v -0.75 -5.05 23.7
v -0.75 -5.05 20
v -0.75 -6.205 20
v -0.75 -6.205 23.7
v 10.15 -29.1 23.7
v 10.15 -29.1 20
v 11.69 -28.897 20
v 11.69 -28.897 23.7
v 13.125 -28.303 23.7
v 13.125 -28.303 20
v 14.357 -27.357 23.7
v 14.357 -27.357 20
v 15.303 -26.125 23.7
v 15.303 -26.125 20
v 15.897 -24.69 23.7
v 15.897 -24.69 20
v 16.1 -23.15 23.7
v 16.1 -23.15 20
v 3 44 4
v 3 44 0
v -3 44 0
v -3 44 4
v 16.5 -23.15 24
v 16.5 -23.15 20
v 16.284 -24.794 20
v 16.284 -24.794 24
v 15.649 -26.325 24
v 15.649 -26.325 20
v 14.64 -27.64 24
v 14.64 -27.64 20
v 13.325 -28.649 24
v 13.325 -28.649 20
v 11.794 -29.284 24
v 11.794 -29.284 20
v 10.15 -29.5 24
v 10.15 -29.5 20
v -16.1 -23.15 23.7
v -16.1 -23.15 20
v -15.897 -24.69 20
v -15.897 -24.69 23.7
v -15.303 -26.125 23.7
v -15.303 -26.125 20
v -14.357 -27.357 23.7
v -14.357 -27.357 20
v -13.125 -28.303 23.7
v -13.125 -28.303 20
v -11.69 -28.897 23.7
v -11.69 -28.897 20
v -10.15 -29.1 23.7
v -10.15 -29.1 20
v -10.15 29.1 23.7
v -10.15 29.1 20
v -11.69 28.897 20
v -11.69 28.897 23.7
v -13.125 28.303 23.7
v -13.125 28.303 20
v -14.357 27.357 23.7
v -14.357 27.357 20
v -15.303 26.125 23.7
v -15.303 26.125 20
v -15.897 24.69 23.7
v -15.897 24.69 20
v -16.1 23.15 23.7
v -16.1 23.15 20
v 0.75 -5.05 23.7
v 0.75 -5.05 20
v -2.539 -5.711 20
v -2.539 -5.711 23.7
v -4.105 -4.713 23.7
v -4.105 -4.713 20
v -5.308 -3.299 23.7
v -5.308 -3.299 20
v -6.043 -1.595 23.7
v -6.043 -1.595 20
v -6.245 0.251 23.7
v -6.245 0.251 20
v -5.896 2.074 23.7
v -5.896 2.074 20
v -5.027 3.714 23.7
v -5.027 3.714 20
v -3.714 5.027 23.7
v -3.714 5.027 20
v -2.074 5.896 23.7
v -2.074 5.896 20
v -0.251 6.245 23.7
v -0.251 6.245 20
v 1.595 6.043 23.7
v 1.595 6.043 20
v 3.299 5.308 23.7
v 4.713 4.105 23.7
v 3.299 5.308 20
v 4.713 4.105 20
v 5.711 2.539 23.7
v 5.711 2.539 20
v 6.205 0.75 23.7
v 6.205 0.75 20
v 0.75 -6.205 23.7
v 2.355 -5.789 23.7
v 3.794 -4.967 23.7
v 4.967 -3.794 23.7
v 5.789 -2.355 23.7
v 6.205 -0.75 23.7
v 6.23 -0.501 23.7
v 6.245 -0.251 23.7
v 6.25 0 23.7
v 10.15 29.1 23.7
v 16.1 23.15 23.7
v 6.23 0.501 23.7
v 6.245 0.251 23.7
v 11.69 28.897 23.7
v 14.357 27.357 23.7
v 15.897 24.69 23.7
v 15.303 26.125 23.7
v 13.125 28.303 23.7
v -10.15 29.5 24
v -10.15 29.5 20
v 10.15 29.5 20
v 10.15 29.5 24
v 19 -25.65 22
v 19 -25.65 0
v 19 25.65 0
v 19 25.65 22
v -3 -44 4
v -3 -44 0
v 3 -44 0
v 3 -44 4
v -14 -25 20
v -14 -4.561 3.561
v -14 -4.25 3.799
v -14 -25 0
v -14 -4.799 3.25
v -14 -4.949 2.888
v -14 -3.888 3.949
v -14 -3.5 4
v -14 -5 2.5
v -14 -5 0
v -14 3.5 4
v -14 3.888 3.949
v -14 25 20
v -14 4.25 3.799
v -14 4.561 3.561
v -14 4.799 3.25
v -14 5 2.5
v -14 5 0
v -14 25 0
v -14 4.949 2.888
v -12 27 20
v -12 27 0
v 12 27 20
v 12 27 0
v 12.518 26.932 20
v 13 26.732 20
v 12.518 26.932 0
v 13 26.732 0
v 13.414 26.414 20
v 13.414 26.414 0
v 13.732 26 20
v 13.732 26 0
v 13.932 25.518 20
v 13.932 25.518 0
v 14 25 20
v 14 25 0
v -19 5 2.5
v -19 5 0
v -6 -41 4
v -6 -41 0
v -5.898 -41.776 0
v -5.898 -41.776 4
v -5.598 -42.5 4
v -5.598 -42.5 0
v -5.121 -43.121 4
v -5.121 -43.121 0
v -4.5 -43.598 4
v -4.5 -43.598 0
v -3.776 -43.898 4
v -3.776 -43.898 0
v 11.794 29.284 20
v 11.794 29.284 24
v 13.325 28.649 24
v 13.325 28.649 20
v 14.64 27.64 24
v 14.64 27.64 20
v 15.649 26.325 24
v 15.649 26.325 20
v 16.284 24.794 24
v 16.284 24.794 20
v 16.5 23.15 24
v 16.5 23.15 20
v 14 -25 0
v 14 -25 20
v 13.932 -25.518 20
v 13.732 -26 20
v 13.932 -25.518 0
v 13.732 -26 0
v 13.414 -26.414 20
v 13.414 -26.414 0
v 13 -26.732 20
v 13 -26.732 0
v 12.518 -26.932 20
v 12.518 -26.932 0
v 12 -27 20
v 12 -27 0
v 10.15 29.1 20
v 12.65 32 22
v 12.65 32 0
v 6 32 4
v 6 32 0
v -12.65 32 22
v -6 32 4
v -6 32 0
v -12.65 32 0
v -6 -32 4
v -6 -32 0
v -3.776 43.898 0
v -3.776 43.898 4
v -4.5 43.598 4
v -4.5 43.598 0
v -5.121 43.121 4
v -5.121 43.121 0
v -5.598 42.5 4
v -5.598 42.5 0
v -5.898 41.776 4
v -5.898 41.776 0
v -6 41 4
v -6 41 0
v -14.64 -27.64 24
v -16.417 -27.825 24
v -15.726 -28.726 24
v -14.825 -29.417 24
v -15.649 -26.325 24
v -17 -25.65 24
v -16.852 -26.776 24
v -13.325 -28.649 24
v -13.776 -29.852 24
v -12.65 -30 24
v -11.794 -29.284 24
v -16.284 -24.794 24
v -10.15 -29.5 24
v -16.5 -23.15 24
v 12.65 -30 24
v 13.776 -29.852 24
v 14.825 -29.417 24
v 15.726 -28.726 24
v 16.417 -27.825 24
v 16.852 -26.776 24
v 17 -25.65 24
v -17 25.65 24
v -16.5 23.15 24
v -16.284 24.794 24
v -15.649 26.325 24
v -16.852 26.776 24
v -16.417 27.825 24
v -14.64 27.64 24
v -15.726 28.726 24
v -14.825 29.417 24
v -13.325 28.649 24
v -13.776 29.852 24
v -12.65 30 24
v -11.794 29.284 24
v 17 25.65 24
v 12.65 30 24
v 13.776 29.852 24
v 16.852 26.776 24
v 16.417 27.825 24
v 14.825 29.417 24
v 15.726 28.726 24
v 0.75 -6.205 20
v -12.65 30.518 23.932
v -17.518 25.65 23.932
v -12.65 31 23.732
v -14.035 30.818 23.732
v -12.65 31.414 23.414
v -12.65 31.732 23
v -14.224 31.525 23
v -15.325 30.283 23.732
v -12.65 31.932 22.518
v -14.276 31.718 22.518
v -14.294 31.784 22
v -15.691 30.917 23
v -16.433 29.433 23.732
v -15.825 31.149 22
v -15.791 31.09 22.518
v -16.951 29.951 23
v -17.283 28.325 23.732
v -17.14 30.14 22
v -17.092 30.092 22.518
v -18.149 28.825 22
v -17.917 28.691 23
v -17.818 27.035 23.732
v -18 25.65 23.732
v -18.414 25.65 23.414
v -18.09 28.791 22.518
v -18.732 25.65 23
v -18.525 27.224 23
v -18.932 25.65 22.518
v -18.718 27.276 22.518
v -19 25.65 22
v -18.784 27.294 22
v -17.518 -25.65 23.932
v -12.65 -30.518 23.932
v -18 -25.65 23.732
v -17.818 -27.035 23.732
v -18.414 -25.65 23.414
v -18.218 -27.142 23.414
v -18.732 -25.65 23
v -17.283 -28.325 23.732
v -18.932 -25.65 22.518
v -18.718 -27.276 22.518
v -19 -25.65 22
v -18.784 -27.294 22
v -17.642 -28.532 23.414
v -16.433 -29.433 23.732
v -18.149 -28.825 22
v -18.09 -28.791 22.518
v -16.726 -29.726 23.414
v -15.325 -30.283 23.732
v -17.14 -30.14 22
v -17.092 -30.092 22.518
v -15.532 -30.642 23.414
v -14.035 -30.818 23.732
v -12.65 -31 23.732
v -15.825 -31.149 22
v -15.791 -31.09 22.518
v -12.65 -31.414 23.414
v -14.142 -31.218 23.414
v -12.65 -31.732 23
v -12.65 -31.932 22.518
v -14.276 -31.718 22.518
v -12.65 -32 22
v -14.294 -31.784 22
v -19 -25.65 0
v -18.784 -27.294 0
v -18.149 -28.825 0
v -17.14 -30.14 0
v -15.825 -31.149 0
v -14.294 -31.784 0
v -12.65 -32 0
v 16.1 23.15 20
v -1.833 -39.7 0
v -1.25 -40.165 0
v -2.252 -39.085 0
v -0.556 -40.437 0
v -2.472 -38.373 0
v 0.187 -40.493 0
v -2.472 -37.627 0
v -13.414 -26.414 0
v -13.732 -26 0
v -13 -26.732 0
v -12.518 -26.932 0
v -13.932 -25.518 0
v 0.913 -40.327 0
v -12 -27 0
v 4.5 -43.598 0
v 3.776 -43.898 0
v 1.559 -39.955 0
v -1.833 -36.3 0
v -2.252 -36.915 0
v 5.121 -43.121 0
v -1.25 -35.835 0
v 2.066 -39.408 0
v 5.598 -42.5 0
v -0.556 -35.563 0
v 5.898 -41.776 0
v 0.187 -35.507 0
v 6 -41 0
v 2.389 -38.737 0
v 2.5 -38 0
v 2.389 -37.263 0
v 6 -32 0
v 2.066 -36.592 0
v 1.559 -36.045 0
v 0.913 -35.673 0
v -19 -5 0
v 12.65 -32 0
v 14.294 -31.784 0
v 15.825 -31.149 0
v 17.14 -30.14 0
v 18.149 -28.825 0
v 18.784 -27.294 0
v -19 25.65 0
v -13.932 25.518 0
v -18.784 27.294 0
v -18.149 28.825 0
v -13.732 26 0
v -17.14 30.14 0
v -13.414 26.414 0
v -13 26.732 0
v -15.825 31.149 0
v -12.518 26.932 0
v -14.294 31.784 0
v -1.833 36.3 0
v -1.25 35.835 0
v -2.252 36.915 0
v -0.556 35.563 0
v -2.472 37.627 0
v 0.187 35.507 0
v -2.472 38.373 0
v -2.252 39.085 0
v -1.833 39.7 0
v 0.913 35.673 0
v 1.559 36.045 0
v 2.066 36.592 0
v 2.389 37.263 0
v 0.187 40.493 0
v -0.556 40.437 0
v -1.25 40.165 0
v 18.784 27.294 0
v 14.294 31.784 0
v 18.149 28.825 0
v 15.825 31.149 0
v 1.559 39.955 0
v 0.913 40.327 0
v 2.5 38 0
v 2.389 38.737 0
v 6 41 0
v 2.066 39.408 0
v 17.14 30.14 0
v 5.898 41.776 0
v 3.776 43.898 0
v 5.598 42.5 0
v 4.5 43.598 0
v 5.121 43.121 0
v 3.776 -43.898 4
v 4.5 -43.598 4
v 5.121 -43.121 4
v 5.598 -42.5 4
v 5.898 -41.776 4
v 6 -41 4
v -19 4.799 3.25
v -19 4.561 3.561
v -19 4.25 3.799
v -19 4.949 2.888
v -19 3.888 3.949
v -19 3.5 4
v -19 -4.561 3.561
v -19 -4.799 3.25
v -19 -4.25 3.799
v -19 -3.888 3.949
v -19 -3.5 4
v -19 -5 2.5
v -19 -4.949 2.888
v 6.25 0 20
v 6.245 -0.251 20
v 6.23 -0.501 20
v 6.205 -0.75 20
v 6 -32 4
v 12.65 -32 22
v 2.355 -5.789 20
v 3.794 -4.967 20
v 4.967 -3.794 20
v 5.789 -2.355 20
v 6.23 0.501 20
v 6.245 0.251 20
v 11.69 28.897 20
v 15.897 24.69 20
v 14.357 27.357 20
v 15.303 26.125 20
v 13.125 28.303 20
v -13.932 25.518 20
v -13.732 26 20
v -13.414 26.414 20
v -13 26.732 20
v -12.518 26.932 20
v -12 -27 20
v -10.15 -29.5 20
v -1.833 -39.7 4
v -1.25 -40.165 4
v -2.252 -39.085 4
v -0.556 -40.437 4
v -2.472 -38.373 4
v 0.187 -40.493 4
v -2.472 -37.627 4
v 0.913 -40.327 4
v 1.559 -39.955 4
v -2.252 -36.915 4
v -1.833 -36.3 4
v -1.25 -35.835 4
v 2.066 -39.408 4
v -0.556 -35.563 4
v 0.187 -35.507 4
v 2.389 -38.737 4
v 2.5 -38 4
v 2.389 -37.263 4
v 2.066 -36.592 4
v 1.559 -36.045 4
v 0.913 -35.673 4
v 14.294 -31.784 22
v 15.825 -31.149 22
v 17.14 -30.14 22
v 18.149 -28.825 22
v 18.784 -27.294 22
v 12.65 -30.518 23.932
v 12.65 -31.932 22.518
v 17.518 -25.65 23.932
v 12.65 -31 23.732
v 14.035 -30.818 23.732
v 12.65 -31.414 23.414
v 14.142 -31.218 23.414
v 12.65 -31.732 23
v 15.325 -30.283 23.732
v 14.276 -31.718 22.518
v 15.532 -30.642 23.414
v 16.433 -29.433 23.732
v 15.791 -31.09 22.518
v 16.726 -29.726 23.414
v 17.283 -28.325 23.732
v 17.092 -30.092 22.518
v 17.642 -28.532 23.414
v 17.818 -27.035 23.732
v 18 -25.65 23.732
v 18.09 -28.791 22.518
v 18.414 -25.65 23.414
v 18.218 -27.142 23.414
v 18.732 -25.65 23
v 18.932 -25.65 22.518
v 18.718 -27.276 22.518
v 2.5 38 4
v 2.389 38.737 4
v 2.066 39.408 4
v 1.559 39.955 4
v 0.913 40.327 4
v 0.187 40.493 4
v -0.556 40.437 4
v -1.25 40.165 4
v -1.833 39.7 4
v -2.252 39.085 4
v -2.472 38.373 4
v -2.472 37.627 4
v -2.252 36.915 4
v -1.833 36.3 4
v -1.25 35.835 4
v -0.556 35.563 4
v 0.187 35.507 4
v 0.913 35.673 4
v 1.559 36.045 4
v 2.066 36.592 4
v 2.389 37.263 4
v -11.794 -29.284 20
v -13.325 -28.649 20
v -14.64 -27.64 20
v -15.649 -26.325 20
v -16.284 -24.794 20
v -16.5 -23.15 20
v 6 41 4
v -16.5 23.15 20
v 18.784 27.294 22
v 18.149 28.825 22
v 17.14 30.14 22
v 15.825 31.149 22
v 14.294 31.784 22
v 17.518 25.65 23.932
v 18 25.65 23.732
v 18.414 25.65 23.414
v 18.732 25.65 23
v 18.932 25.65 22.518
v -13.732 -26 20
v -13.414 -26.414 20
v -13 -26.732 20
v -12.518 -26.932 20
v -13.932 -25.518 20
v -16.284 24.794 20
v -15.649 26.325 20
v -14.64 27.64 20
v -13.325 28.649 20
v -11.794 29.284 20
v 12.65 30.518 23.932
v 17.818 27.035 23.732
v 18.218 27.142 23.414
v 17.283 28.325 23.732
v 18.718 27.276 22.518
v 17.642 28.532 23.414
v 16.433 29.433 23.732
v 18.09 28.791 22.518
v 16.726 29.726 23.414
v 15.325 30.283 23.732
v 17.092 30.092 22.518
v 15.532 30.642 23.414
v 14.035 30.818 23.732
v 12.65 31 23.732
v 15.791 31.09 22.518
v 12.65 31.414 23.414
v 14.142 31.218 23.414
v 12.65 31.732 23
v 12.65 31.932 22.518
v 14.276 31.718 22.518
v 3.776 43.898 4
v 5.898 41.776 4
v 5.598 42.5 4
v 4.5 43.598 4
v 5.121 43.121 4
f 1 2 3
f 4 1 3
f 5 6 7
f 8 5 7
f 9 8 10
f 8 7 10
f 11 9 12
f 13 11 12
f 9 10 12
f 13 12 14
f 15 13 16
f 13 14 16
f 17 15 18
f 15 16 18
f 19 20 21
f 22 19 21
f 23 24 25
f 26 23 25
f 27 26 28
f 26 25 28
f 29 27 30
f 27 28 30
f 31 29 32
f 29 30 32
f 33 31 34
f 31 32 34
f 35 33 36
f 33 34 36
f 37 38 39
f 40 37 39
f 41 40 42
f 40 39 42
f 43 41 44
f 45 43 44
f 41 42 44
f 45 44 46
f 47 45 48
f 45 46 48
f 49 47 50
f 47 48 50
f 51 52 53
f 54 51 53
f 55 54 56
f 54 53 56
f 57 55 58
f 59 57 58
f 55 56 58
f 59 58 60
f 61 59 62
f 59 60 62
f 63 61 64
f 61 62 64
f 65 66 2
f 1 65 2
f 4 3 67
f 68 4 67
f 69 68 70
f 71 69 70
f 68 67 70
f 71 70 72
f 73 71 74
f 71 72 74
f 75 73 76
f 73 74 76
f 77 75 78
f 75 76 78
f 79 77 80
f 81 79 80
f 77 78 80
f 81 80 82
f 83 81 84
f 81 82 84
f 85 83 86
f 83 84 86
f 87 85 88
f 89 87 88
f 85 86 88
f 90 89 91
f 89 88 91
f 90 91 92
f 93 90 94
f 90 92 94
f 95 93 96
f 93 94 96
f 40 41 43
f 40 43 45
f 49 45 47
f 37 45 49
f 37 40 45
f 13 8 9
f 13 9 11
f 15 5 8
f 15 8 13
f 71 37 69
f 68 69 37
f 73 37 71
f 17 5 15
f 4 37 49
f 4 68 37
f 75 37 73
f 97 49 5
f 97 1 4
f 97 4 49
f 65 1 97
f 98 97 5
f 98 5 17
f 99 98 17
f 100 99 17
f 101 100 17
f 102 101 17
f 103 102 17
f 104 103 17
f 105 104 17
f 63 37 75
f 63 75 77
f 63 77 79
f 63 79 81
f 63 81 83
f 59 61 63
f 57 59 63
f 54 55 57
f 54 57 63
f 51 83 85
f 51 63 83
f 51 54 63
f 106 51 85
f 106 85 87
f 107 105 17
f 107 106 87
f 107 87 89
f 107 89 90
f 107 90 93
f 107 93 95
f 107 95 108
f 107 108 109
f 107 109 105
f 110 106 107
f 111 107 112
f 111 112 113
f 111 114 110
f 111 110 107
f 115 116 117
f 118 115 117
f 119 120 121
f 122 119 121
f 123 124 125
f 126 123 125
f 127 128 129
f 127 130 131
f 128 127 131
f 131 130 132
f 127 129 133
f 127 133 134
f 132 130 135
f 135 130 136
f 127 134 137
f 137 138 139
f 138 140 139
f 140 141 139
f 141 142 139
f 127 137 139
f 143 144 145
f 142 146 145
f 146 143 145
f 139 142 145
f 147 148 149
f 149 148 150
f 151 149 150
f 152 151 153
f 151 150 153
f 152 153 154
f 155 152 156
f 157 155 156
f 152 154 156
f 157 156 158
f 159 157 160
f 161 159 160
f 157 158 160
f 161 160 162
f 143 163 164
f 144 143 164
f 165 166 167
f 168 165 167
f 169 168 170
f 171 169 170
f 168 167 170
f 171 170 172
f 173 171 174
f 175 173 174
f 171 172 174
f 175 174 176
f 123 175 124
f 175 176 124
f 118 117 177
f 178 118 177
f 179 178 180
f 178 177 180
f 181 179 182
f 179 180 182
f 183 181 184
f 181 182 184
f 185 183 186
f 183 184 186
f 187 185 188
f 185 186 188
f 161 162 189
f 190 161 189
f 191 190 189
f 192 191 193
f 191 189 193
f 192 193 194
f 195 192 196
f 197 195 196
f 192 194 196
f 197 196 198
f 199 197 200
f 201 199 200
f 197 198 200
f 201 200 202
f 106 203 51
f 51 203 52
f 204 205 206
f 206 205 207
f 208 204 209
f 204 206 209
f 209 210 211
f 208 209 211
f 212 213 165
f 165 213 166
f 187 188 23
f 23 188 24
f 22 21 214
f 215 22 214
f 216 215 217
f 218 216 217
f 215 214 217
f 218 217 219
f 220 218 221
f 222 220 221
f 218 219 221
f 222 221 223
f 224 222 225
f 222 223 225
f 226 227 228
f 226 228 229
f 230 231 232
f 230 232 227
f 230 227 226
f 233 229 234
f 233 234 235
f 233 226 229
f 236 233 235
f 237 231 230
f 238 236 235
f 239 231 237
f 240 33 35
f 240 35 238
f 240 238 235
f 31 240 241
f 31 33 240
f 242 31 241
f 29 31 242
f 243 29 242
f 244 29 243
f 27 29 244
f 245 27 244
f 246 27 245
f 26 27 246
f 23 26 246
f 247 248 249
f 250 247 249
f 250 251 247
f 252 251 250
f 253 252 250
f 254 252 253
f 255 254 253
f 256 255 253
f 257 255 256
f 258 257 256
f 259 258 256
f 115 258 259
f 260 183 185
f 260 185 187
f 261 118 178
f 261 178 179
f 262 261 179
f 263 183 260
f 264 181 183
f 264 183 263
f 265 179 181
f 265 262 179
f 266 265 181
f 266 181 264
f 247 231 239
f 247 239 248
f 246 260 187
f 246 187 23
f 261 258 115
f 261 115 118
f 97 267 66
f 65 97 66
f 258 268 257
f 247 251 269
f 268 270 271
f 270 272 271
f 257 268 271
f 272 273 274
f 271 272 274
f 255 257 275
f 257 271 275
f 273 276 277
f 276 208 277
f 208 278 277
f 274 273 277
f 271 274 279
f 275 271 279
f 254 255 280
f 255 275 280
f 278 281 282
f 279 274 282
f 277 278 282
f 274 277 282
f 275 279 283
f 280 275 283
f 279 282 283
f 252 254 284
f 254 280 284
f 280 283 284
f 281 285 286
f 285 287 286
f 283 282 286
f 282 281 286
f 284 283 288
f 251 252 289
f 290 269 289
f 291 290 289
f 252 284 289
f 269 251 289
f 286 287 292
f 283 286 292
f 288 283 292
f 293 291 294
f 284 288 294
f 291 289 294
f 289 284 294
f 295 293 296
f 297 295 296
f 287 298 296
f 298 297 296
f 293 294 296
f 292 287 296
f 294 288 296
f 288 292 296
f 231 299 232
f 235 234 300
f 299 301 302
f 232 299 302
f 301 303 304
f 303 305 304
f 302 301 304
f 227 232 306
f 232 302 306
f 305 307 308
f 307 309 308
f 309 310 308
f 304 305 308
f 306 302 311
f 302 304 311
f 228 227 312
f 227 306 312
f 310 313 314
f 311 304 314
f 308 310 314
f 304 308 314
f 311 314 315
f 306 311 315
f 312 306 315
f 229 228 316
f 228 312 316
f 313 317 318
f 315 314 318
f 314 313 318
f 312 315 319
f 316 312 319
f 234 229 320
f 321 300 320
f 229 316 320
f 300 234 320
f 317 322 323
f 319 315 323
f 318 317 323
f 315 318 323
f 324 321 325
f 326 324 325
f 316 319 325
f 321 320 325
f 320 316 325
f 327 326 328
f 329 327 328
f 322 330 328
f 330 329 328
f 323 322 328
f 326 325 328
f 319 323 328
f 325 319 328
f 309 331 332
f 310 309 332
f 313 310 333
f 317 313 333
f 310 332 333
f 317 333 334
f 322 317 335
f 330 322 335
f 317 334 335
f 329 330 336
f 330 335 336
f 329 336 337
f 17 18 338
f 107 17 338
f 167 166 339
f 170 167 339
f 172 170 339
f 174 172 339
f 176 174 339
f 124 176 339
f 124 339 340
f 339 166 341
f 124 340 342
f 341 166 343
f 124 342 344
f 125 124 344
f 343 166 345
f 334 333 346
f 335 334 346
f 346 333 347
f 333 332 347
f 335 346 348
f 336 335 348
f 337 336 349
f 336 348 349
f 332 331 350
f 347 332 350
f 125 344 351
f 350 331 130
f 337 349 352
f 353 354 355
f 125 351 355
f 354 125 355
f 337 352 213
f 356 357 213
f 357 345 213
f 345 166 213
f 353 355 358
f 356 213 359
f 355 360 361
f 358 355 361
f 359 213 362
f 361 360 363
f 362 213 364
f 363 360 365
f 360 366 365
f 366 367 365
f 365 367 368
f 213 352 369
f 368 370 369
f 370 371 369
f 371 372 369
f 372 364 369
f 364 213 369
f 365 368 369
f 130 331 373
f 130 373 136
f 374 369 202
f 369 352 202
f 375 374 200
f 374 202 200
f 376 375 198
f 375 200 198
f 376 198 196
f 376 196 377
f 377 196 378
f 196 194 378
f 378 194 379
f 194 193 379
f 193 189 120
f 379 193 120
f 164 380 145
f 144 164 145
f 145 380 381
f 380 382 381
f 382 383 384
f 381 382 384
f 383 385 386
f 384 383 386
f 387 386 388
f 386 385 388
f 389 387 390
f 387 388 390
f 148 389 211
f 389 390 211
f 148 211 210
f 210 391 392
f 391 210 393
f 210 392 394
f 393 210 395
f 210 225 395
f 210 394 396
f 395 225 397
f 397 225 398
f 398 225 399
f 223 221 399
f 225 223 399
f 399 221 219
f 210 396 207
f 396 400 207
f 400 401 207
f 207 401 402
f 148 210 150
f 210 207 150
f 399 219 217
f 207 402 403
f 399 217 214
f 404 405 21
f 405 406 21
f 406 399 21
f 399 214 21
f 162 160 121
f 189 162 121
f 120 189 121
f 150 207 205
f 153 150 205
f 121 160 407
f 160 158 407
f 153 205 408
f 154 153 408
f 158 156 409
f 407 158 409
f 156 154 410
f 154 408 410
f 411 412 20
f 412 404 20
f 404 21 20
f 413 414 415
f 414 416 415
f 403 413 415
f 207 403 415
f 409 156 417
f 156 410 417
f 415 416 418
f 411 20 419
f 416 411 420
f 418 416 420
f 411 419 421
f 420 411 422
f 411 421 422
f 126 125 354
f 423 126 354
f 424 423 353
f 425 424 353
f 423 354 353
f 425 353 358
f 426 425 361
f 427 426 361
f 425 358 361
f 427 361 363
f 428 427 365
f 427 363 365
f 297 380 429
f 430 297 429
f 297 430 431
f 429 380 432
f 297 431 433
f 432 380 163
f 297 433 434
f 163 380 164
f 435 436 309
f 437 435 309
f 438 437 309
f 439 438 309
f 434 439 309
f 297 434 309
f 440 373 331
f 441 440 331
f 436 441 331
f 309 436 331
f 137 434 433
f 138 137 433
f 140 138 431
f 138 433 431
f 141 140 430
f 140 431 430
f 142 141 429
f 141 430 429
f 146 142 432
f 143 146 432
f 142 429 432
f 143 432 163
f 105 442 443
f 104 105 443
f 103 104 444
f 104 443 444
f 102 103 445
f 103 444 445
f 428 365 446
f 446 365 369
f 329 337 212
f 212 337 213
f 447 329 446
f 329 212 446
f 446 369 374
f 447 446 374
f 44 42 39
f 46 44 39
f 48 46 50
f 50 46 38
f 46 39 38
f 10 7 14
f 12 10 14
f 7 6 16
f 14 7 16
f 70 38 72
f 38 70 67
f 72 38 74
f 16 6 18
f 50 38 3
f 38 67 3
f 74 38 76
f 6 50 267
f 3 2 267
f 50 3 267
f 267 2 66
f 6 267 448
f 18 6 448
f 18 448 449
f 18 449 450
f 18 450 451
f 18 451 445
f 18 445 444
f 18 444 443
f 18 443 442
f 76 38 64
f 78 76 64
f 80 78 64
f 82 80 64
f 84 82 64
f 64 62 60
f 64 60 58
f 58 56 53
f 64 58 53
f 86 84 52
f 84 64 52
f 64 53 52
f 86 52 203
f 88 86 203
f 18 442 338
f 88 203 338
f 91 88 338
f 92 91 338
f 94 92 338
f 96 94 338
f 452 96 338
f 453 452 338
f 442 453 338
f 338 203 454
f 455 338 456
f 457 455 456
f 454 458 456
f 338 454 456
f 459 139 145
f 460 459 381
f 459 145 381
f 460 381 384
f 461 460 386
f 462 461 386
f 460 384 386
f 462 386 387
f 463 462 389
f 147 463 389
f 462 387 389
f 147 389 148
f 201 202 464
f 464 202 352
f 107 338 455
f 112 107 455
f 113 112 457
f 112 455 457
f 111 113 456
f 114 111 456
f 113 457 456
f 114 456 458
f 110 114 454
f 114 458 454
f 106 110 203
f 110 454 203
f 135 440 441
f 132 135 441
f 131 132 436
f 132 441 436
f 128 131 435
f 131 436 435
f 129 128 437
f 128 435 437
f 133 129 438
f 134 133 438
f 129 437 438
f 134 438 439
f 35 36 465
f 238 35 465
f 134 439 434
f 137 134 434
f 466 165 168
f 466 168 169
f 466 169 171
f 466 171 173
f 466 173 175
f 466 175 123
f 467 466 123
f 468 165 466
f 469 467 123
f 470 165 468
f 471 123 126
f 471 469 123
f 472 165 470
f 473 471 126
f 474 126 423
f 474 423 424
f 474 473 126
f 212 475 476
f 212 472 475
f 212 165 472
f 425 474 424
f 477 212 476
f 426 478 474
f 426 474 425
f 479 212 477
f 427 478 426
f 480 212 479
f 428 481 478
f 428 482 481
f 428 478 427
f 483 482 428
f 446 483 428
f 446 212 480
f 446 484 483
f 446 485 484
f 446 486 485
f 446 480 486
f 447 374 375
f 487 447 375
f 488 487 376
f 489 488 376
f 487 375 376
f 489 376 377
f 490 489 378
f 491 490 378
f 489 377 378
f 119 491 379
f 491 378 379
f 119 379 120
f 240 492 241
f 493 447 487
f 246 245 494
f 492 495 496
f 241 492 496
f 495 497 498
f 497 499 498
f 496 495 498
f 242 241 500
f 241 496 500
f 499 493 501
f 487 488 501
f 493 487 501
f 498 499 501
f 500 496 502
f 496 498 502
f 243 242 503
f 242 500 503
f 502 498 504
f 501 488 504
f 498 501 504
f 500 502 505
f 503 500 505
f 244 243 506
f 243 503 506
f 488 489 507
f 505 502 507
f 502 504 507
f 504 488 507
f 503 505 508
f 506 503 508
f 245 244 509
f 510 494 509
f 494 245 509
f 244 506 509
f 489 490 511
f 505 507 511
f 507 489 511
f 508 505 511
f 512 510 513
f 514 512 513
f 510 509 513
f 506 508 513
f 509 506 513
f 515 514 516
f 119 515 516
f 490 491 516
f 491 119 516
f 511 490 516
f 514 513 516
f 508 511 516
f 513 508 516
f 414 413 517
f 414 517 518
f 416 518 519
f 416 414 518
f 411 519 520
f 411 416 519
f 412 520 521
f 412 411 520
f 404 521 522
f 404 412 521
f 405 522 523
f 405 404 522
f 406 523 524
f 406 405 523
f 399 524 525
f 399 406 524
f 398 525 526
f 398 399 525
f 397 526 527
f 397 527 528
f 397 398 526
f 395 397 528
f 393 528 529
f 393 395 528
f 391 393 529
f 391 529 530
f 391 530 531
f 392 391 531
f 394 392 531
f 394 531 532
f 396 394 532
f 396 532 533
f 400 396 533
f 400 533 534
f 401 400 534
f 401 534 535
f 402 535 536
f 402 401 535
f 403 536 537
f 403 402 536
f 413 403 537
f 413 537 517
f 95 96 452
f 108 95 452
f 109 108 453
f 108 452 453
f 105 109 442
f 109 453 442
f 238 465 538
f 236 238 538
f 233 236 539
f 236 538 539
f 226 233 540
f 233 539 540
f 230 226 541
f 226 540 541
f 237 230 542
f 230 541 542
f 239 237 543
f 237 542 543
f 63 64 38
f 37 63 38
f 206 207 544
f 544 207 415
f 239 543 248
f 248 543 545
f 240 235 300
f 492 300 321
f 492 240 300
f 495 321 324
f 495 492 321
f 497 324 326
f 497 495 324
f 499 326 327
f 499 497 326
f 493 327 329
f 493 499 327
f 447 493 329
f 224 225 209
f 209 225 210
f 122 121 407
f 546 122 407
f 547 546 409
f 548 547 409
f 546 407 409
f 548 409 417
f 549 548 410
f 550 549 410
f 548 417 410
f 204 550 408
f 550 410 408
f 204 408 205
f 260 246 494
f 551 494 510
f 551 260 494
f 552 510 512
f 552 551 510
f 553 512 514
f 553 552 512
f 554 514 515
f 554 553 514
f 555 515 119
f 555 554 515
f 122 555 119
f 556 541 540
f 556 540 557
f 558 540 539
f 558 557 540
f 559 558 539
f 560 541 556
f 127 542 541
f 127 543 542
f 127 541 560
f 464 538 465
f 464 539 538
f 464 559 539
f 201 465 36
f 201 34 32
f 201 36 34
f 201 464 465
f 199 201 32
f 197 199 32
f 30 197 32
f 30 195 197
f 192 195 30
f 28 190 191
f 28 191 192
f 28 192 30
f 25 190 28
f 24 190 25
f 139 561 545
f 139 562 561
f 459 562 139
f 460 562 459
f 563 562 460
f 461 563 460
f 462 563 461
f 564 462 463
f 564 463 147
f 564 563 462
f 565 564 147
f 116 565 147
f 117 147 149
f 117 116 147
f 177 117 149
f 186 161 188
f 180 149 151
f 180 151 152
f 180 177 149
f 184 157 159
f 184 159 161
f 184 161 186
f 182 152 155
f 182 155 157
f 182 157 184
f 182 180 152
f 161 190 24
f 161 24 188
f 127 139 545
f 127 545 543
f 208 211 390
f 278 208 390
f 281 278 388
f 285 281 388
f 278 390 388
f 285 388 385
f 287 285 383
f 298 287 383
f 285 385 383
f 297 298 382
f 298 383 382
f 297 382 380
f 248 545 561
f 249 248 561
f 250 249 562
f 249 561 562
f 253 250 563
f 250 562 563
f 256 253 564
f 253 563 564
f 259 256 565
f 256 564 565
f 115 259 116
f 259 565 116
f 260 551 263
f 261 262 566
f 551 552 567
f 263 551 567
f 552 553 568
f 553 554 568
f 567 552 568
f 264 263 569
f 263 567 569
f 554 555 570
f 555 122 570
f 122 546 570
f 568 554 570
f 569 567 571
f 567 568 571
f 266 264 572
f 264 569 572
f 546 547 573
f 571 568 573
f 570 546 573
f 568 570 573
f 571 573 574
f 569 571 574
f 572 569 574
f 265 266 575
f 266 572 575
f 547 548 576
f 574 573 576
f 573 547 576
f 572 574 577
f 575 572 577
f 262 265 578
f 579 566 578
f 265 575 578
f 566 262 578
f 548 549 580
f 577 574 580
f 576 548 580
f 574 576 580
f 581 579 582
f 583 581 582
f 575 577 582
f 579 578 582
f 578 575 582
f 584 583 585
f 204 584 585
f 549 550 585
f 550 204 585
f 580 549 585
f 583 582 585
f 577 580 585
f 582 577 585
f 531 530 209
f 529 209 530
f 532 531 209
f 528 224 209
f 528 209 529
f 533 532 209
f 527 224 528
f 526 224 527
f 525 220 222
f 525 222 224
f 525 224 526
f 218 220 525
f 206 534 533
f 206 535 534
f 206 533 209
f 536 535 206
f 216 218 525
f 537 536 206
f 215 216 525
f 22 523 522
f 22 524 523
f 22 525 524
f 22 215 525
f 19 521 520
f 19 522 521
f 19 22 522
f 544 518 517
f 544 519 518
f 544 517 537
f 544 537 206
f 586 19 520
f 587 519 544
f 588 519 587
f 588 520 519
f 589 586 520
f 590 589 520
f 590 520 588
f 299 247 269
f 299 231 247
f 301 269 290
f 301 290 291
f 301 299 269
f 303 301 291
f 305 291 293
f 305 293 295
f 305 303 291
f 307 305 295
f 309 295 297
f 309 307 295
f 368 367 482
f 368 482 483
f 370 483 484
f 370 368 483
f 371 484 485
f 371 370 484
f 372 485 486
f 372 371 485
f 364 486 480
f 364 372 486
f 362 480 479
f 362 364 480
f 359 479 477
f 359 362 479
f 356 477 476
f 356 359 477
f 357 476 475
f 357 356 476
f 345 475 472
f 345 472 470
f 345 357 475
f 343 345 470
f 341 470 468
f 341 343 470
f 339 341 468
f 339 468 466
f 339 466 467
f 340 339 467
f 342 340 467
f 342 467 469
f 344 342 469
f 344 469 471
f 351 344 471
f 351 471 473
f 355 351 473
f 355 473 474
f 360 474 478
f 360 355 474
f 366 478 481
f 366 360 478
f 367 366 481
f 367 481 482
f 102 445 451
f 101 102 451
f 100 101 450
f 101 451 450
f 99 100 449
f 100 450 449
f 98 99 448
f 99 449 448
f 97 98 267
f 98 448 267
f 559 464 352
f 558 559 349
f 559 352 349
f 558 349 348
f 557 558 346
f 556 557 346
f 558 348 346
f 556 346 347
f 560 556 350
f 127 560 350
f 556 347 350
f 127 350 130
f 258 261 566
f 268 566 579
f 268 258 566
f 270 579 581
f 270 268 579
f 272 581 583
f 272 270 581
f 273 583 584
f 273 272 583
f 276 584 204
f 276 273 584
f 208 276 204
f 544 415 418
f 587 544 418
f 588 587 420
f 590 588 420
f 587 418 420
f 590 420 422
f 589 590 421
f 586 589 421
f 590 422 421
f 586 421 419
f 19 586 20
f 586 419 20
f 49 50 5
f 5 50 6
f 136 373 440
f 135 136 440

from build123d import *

# Parameters (mm, degrees)
F1_DEPTH = 20
F2_DEPTH = 24
F0_R     = 2.5
F3_DEPTH = 4
F5_R     = 2
F7_DEPTH = 3.7
F9_DEPTH = 5


with BuildPart() as f1:
    # F0 (on Top) → F1 (new body)
    with BuildSketch(Plane.XY):
        with BuildLine():
            ThreePointArc((19, 25.65), (17.140128, 30.140128), (12.65, 32))
            Line((12.65, 32), (6, 32))
            Line((6, 32), (-6, 32))
            Line((-6, 32), (-12.65, 32))
            ThreePointArc((-12.65, 32), (-17.140128, 30.140128), (-19, 25.65))
            Line((-19, 25.65), (-19, -25.65))
            ThreePointArc((-19, -25.65), (-17.140128, -30.140128), (-12.65, -32))
            Line((-12.65, -32), (-6, -32))
            Line((-6, -32), (6, -32))
            Line((6, -32), (12.65, -32))
            ThreePointArc((12.65, -32), (17.140128, -30.140128), (19, -25.65))
            Line((19, -25.65), (19, 25.65))
        make_face()
        with BuildLine():
            Line((-10.15, 29.5), (10.15, 29.5))
            ThreePointArc((10.15, 29.5), (14.640128, 27.640128), (16.5, 23.15))
            Line((16.5, 23.15), (16.5, -23.15))
            ThreePointArc((16.5, -23.15), (14.640128, -27.640128), (10.15, -29.5))
            Line((10.15, -29.5), (-10.15, -29.5))
            ThreePointArc((-10.15, -29.5), (-14.640128, -27.640128), (-16.5, -23.15))
            Line((-16.5, -23.15), (-16.5, 23.15))
            ThreePointArc((-16.5, 23.15), (-14.640128, 27.640128), (-10.15, 29.5))
        make_face(mode=Mode.SUBTRACT)
        with BuildLine():
            ThreePointArc((16.5, 23.15), (14.640128, 27.640128), (10.15, 29.5))
            Line((10.15, 29.5), (-10.15, 29.5))
            ThreePointArc((-10.15, 29.5), (-14.640128, 27.640128), (-16.5, 23.15))
            Line((-16.5, 23.15), (-16.5, -23.15))
            ThreePointArc((-16.5, -23.15), (-14.640128, -27.640128), (-10.15, -29.5))
            Line((-10.15, -29.5), (10.15, -29.5))
            ThreePointArc((10.15, -29.5), (14.640128, -27.640128), (16.5, -23.15))
            Line((16.5, -23.15), (16.5, 23.15))
        make_face()
        with BuildLine():
            Line((-12, 27), (12, 27))
            ThreePointArc((12, 27), (13.414214, 26.414214), (14, 25))
            Line((14, 25), (14, -25))
            ThreePointArc((14, -25), (13.414214, -26.414214), (12, -27))
            Line((12, -27), (-12, -27))
            ThreePointArc((-12, -27), (-13.414214, -26.414214), (-14, -25))
            Line((-14, -25), (-14, 25))
            ThreePointArc((-14, 25), (-13.414214, 26.414214), (-12, 27))
        make_face(mode=Mode.SUBTRACT)
    extrude(amount=F1_DEPTH)

    # F0 (on Top) → F2 (join)
    with BuildSketch(Plane.XY):
        with BuildLine():
            ThreePointArc((19, 25.65), (17.140128, 30.140128), (12.65, 32))
            Line((12.65, 32), (6, 32))
            Line((6, 32), (-6, 32))
            Line((-6, 32), (-12.65, 32))
            ThreePointArc((-12.65, 32), (-17.140128, 30.140128), (-19, 25.65))
            Line((-19, 25.65), (-19, -25.65))
            ThreePointArc((-19, -25.65), (-17.140128, -30.140128), (-12.65, -32))
            Line((-12.65, -32), (-6, -32))
            Line((-6, -32), (6, -32))
            Line((6, -32), (12.65, -32))
            ThreePointArc((12.65, -32), (17.140128, -30.140128), (19, -25.65))
            Line((19, -25.65), (19, 25.65))
        make_face()
        with BuildLine():
            Line((-10.15, 29.5), (10.15, 29.5))
            ThreePointArc((10.15, 29.5), (14.640128, 27.640128), (16.5, 23.15))
            Line((16.5, 23.15), (16.5, -23.15))
            ThreePointArc((16.5, -23.15), (14.640128, -27.640128), (10.15, -29.5))
            Line((10.15, -29.5), (-10.15, -29.5))
            ThreePointArc((-10.15, -29.5), (-14.640128, -27.640128), (-16.5, -23.15))
            Line((-16.5, -23.15), (-16.5, 23.15))
            ThreePointArc((-16.5, 23.15), (-14.640128, 27.640128), (-10.15, 29.5))
        make_face(mode=Mode.SUBTRACT)
    extrude(amount=F2_DEPTH)

    # F0 (on Top) → F3 (join)
    with BuildSketch(Plane.XY):
        with BuildLine():
            Line((-6, 32), (6, 32))
            Line((6, 32), (6, 41))
            ThreePointArc((6, 41), (5.12132, 43.12132), (3, 44))
            Line((3, 44), (-3, 44))
            ThreePointArc((-3, 44), (-5.12132, 43.12132), (-6, 41))
            Line((-6, 41), (-6, 32))
        make_face()
        with Locations((0, 38)):
            Circle(F0_R, mode=Mode.SUBTRACT)
        with BuildLine():
            Line((6, -41), (6, -32))
            Line((6, -32), (-6, -32))
            Line((-6, -32), (-6, -41))
            ThreePointArc((-6, -41), (-5.12132, -43.12132), (-3, -44))
            Line((-3, -44), (3, -44))
            ThreePointArc((3, -44), (5.12132, -43.12132), (6, -41))
        make_face()
        with Locations((0, -38)):
            Circle(F0_R, mode=Mode.SUBTRACT)
    extrude(amount=F3_DEPTH)

    # F5
    f5_edges = [f1.edges().sort_by_distance(p)[0] for p in [
        (-19, 0, 24),
        (-17.140128, 30.140128, 24),
        (0, 32, 24),
        (17.140128, 30.140128, 24),
        (19, 0, 24),
        (17.140128, -30.140128, 24),
        (0, -32, 24),
        (-17.140128, -30.140128, 24),
    ]]
    fillet(f5_edges, radius=F5_R)

    # F8 (on face) → F9 (cut)
    with BuildSketch(Plane(origin=(-19, 0, 0), x_dir=(0, -1, 0), z_dir=(-1, 0, 0))):
        with BuildLine():
            Line((-5, 2.5), (-5, 0))
            Line((-5, 0), (5, 0))
            Line((5, 0), (5, 2.5))
            ThreePointArc((5, 2.5), (4.56066, 3.56066), (3.5, 4))
            Line((3.5, 4), (-3.5, 4))
            ThreePointArc((-3.5, 4), (-4.56066, 3.56066), (-5, 2.5))
        make_face()
    extrude(amount=-F9_DEPTH, mode=Mode.SUBTRACT)


with BuildPart() as f7:
    # F6 (on face) → F7 (new body)
    with BuildSketch(Plane.XY.offset(20)):
        with BuildLine():
            Line((16.1, -23.15), (16.1, 23.15))
            ThreePointArc((16.1, 23.15), (14.357285, 27.357285), (10.15, 29.1))
            Line((10.15, 29.1), (-10.15, 29.1))
            ThreePointArc((-10.15, 29.1), (-14.357285, 27.357285), (-16.1, 23.15))
            Line((-16.1, 23.15), (-16.1, -23.15))
            ThreePointArc((-16.1, -23.15), (-14.357285, -27.357285), (-10.15, -29.1))
            Line((-10.15, -29.1), (10.15, -29.1))
            ThreePointArc((10.15, -29.1), (14.357285, -27.357285), (16.1, -23.15))
        make_face()
        with BuildLine():
            ThreePointArc((-0.75, -6.204837), (-4.419417, 4.419417), (6.204837, 0.75))
            Line((6.204837, 0.75), (7.45, 0.75))
            Line((7.45, 0.75), (7.45, -0.75))
            Line((7.45, -0.75), (6.204837, -0.75))
            ThreePointArc((6.204837, -0.75), (4.419417, -4.419417), (0.75, -6.204837))
            Line((0.75, -6.204837), (0.75, -7.45))
            Line((0.75, -7.45), (-0.75, -7.45))
            Line((-0.75, -7.45), (-0.75, -6.204837))
        make_face(mode=Mode.SUBTRACT)
        with BuildLine():
            ThreePointArc((6.204837, 0.75), (6.238699, 0.375679), (6.25, 0))
            ThreePointArc((6.25, 0), (6.238699, -0.375679), (6.204837, -0.75))
            Line((6.204837, -0.75), (7.45, -0.75))
            Line((7.45, -0.75), (7.45, 0.75))
            Line((7.45, 0.75), (6.204837, 0.75))
        make_face()
        with BuildLine():
            Line((-0.75, -5.05), (-0.75, -6.204837))
            ThreePointArc((-0.75, -6.204837), (0, -6.25), (0.75, -6.204837))
            Line((0.75, -6.204837), (0.75, -5.05))
            Line((0.75, -5.05), (-0.75, -5.05))
        make_face()
        with BuildLine():
            ThreePointArc((0.75, -6.204837), (0, -6.25), (-0.75, -6.204837))
            Line((-0.75, -6.204837), (-0.75, -7.45))
            Line((-0.75, -7.45), (0.75, -7.45))
            Line((0.75, -7.45), (0.75, -6.204837))
        make_face()
    extrude(amount=F7_DEPTH)


solid = Compound([f1.part, f7.part])
